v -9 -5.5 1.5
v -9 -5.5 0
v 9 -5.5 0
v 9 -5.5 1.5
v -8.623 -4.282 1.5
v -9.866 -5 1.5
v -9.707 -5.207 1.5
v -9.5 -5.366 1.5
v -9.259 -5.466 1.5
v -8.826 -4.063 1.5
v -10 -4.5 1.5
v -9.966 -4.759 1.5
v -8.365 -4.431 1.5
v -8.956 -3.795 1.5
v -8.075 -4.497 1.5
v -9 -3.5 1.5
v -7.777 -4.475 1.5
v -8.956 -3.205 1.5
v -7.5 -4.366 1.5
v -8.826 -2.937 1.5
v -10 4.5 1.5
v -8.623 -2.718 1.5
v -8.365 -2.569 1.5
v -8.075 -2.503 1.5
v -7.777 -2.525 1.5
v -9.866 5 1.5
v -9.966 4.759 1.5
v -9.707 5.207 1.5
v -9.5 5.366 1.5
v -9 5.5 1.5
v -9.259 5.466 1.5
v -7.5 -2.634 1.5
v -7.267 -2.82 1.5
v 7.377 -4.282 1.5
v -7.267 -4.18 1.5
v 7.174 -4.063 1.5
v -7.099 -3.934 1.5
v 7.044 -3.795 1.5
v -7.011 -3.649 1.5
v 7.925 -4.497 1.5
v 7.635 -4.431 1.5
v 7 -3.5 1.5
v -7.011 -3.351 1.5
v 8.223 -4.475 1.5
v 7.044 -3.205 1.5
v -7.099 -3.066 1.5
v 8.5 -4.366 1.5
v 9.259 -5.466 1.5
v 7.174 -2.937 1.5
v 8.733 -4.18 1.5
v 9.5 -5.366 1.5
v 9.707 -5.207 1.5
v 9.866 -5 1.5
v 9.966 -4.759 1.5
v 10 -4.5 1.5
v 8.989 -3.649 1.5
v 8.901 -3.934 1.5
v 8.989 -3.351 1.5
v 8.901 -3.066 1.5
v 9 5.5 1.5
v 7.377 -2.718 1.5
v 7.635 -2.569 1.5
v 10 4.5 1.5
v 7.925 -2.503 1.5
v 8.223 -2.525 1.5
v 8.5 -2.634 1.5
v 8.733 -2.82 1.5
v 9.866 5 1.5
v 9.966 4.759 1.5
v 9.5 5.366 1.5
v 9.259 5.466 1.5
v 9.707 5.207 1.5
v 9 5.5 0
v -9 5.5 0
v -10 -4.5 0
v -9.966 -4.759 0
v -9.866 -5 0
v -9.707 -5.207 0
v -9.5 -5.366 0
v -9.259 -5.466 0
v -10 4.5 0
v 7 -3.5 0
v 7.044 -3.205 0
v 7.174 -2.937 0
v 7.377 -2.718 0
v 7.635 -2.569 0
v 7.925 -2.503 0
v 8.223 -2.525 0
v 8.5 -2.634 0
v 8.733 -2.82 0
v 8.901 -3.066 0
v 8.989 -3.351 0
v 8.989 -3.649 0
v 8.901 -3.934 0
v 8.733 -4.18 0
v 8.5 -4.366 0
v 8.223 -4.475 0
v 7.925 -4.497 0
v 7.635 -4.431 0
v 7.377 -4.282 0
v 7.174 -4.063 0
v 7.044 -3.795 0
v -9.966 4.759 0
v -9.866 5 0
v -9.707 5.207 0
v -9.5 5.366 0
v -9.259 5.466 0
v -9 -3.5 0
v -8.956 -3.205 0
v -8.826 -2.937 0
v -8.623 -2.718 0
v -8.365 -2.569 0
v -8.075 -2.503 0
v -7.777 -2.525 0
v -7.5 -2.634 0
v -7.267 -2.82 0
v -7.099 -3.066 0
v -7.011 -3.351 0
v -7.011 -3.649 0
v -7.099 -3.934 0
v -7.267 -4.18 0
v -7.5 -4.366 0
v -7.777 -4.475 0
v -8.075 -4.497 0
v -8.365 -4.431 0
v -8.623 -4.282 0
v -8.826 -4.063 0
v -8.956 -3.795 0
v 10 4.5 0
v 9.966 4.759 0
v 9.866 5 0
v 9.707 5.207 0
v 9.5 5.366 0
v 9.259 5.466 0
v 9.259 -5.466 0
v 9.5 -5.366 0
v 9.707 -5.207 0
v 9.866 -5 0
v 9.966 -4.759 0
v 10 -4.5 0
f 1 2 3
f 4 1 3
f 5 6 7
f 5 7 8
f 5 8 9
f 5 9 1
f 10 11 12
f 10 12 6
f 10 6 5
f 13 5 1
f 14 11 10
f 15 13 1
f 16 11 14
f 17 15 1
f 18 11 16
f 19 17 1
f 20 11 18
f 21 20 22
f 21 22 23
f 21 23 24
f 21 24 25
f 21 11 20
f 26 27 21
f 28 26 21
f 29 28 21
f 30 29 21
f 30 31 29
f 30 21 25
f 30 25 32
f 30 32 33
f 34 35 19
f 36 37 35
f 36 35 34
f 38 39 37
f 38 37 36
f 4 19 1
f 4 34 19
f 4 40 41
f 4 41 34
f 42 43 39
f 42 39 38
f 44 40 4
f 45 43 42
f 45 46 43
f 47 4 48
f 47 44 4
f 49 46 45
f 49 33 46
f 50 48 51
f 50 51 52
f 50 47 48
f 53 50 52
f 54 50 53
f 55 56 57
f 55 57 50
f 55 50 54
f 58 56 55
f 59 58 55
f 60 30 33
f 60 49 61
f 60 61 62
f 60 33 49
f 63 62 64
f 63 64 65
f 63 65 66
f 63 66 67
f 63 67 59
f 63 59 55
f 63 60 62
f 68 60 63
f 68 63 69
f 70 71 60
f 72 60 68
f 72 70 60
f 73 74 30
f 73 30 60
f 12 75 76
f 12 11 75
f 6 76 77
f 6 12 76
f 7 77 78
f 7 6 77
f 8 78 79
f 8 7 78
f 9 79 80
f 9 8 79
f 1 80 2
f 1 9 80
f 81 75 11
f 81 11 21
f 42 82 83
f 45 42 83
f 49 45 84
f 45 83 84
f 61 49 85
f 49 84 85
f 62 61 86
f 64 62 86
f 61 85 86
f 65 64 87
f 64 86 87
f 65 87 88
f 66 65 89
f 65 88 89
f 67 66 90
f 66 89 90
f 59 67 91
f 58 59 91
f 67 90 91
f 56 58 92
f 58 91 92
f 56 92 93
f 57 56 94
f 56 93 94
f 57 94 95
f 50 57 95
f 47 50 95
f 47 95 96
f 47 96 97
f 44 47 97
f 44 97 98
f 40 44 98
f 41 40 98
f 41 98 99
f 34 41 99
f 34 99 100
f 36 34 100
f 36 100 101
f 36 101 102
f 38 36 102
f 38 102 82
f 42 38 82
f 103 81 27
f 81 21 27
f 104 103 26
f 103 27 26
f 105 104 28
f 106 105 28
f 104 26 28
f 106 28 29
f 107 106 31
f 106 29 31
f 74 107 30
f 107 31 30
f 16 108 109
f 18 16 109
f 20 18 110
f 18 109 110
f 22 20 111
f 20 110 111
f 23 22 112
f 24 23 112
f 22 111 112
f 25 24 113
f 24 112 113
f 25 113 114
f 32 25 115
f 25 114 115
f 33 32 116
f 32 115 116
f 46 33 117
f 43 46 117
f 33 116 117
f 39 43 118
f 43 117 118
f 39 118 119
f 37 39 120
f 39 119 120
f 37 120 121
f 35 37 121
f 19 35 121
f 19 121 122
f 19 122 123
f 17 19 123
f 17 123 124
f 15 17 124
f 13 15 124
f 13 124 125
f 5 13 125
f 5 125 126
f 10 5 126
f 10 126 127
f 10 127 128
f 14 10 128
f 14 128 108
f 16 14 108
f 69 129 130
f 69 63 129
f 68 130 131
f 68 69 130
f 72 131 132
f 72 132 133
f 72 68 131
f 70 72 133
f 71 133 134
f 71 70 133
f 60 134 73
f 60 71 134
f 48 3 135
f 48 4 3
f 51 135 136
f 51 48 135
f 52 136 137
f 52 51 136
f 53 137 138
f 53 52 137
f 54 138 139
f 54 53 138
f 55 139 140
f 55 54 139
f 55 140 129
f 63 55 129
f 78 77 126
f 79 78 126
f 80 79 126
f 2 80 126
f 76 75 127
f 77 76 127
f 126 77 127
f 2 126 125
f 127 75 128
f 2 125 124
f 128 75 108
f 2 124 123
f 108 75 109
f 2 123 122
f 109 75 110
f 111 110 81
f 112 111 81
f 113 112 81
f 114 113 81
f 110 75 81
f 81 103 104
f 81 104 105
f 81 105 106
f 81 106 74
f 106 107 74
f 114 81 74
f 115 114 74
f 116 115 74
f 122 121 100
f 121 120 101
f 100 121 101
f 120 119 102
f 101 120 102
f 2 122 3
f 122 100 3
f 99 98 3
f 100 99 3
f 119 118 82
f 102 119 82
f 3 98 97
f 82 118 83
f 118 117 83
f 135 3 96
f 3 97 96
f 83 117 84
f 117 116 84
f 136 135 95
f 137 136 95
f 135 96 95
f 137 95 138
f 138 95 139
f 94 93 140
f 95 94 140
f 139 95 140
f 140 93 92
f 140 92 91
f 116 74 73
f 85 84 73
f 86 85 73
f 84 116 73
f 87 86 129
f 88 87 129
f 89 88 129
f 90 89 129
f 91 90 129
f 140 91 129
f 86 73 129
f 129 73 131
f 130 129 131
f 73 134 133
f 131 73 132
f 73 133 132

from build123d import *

# Parameters (mm, degrees)
SZKIC1_W                       = 20
SZKIC1_H                       = 11
DODANIE_WYCI_GNI_CIE1_DEPTH    = 1.5
ZAOKR_GLENIE1_R                = 1
OTWORY_USTALAJ_CE_2_0MM1_D     = 2
OTWORY_USTALAJ_CE_2_0MM1_DEPTH = 2
OTWORY_USTALAJ_CE_2_0MM1_TIP   = 0.600860619


with BuildPart() as part:
    # Szkic1 → Dodanie-wyciągnięcie1 (new body)
    with BuildSketch(Plane.XY):
        Rectangle(SZKIC1_W, SZKIC1_H)
    extrude(amount=DODANIE_WYCI_GNI_CIE1_DEPTH)

    # Zaokrąglenie1
    zaokr_glenie1_edges = [part.edges().sort_by_distance(p)[0] for p in [
        (10, -5.5, 0.75),
        (-10, -5.5, 0.75),
        (-10, 5.5, 0.75),
        (10, 5.5, 0.75),
    ]]
    fillet(zaokr_glenie1_edges, radius=ZAOKR_GLENIE1_R)

    # Otwory ustalające Ø2.0mm1
    with Locations(Plane.XY.offset(1.5)):
        with Locations((-8, -3.5), (8, -3.5)):
            Hole(OTWORY_USTALAJ_CE_2_0MM1_D / 2, depth=OTWORY_USTALAJ_CE_2_0MM1_DEPTH)
            with Locations((0, 0, -(OTWORY_USTALAJ_CE_2_0MM1_DEPTH + OTWORY_USTALAJ_CE_2_0MM1_TIP / 2))):  # 118° drill point
                Cone(0, OTWORY_USTALAJ_CE_2_0MM1_D / 2, OTWORY_USTALAJ_CE_2_0MM1_TIP, mode=Mode.SUBTRACT)


solid = part.part
